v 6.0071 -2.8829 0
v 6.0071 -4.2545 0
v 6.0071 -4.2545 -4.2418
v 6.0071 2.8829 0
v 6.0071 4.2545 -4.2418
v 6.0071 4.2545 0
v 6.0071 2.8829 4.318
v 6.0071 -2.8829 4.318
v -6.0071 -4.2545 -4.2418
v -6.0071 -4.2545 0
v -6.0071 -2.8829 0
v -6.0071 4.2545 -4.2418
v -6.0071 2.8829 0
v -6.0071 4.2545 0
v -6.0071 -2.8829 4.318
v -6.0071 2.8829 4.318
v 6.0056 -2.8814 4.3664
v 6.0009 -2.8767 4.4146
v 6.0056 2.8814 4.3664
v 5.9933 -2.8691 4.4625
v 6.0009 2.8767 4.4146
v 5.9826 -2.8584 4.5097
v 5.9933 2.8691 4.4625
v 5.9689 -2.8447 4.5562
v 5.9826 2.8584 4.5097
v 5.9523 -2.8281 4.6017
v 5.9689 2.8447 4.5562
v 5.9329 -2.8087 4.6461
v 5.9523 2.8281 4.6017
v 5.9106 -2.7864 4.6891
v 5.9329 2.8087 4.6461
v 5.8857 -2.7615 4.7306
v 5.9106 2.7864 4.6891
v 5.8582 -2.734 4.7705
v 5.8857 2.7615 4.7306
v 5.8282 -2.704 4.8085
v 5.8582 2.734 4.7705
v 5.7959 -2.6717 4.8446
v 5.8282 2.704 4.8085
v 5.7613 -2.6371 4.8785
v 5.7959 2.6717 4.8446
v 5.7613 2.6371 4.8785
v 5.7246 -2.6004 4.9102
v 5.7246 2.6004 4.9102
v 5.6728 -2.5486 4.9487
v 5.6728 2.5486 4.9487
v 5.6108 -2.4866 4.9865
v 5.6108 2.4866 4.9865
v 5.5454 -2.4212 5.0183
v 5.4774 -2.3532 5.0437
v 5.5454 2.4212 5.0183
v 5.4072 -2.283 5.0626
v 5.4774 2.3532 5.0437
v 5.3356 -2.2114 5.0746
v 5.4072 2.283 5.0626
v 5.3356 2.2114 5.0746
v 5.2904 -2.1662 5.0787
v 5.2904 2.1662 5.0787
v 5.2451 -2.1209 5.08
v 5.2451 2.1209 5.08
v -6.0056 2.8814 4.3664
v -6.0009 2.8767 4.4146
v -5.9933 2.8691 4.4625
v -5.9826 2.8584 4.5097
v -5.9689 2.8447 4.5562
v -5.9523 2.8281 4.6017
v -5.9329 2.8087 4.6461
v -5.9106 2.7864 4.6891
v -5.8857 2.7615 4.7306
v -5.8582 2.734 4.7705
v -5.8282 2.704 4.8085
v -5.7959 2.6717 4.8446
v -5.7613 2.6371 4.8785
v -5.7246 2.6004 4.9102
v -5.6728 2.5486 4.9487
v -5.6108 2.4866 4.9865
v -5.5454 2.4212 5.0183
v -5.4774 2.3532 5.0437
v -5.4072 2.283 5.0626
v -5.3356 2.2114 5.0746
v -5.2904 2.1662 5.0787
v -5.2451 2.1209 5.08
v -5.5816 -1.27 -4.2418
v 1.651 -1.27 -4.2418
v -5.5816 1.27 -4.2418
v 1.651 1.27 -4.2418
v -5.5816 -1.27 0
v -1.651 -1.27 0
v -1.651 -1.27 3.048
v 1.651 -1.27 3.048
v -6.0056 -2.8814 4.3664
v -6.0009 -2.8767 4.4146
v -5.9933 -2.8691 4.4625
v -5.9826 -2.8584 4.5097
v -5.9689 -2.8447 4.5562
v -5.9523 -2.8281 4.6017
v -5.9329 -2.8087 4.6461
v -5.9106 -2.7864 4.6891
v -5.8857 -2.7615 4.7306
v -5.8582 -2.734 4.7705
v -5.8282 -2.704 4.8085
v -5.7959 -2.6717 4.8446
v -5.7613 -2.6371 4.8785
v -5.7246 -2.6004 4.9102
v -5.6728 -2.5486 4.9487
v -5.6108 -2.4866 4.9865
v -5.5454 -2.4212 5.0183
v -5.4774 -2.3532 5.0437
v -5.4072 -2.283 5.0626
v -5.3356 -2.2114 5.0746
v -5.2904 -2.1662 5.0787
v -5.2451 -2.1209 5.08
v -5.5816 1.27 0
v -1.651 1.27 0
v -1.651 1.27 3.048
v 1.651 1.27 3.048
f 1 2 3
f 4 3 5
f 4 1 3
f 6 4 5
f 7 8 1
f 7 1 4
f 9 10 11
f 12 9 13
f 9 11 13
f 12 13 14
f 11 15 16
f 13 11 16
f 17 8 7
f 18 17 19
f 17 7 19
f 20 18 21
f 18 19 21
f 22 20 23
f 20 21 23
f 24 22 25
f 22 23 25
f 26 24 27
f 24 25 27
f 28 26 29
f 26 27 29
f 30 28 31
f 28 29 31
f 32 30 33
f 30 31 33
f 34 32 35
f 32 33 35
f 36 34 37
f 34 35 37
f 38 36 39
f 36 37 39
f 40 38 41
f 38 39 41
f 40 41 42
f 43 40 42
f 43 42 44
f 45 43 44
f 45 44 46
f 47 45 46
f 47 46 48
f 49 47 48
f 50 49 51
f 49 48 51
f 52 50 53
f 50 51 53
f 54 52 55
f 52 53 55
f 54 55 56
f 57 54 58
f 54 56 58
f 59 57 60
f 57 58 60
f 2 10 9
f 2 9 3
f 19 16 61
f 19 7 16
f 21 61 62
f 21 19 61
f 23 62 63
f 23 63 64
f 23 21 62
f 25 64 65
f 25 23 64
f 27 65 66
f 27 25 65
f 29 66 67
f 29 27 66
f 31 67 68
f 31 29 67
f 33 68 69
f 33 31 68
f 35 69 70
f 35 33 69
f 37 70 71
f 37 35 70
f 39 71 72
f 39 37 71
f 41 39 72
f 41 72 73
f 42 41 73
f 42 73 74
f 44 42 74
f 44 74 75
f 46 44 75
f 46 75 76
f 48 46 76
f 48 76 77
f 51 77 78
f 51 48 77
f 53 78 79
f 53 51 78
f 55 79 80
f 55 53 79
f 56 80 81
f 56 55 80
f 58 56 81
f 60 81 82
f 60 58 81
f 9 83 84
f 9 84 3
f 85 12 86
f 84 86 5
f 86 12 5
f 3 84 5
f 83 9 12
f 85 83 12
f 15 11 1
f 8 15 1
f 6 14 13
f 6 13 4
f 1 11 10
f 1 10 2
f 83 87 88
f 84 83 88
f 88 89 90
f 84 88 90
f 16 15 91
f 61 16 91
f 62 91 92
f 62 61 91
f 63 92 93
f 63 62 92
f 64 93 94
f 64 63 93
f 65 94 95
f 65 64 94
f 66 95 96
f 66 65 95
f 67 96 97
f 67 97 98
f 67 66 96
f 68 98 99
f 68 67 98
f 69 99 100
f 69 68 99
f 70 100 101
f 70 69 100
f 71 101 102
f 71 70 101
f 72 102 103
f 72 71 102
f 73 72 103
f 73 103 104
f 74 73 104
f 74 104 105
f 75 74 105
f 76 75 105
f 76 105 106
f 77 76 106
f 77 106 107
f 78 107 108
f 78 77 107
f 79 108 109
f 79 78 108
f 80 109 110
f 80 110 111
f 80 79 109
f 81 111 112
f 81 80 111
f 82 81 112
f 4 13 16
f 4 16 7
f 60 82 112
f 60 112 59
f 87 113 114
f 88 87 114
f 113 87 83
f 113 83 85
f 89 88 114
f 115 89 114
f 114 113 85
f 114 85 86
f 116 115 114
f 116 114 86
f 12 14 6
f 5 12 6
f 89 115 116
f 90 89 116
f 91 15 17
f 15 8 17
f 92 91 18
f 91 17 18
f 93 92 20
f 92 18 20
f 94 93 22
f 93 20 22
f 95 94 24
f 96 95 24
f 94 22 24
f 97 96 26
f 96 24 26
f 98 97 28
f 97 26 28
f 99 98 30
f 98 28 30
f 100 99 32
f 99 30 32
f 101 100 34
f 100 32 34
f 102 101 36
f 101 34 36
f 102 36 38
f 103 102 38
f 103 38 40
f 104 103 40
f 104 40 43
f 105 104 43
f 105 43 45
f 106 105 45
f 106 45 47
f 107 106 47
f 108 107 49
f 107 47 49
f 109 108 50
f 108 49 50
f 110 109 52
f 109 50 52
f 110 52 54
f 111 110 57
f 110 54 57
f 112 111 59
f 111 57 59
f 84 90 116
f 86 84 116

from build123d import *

# Parameters (mm, degrees)
F0_W          = 12.0142
F0_H          = 5.7658
F1_DEPTH      = 5.08
F2_W          = 12.0142
F2_H          = 8.509
F3_DEPTH      = 4.2418
F4_R          = 0.762
F6_W          = 4.1768109557
F6_H          = 2.54
F7_DEPTH      = 4.2418
F5_W          = 3.302
F5_H          = 2.54
F8_DEPTH      = 4.318
F8_DEPTH_BACK = 3.048


with BuildPart() as f1:
    # F0 (on Top) → F1 (new body)
    with BuildSketch(Plane.XY):
        Rectangle(F0_W, F0_H)
    extrude(amount=F1_DEPTH)

    # F2 (on Top) → F3 (join)
    with BuildSketch(Plane.XY):
        Rectangle(F2_W, F2_H)
    extrude(amount=-F3_DEPTH)

    # F4
    f4_edges = [f1.edges().sort_by_distance(p)[0] for p in [
        (6.0071, 0, 5.08),
        (0, 2.8829, 5.08),
        (-6.0071, 0, 5.08),
        (0, -2.8829, 5.08),
    ]]
    fillet(f4_edges, radius=F4_R)

    # F6 (on Top) → F7 (cut)
    with BuildSketch(Plane.XY):
        with Locations((-3.4931976115, 0)):
            Rectangle(F6_W, F6_H)
    extrude(amount=-F7_DEPTH, mode=Mode.SUBTRACT)

    # F5 (on Top) → F8 (cut, two sides)
    with BuildSketch(Plane.XY) as f8_sk:
        Rectangle(F5_W, F5_H)
    extrude(amount=-F8_DEPTH, mode=Mode.SUBTRACT)
    extrude(f8_sk.sketch, amount=F8_DEPTH_BACK, mode=Mode.SUBTRACT)


solid = f1.part
